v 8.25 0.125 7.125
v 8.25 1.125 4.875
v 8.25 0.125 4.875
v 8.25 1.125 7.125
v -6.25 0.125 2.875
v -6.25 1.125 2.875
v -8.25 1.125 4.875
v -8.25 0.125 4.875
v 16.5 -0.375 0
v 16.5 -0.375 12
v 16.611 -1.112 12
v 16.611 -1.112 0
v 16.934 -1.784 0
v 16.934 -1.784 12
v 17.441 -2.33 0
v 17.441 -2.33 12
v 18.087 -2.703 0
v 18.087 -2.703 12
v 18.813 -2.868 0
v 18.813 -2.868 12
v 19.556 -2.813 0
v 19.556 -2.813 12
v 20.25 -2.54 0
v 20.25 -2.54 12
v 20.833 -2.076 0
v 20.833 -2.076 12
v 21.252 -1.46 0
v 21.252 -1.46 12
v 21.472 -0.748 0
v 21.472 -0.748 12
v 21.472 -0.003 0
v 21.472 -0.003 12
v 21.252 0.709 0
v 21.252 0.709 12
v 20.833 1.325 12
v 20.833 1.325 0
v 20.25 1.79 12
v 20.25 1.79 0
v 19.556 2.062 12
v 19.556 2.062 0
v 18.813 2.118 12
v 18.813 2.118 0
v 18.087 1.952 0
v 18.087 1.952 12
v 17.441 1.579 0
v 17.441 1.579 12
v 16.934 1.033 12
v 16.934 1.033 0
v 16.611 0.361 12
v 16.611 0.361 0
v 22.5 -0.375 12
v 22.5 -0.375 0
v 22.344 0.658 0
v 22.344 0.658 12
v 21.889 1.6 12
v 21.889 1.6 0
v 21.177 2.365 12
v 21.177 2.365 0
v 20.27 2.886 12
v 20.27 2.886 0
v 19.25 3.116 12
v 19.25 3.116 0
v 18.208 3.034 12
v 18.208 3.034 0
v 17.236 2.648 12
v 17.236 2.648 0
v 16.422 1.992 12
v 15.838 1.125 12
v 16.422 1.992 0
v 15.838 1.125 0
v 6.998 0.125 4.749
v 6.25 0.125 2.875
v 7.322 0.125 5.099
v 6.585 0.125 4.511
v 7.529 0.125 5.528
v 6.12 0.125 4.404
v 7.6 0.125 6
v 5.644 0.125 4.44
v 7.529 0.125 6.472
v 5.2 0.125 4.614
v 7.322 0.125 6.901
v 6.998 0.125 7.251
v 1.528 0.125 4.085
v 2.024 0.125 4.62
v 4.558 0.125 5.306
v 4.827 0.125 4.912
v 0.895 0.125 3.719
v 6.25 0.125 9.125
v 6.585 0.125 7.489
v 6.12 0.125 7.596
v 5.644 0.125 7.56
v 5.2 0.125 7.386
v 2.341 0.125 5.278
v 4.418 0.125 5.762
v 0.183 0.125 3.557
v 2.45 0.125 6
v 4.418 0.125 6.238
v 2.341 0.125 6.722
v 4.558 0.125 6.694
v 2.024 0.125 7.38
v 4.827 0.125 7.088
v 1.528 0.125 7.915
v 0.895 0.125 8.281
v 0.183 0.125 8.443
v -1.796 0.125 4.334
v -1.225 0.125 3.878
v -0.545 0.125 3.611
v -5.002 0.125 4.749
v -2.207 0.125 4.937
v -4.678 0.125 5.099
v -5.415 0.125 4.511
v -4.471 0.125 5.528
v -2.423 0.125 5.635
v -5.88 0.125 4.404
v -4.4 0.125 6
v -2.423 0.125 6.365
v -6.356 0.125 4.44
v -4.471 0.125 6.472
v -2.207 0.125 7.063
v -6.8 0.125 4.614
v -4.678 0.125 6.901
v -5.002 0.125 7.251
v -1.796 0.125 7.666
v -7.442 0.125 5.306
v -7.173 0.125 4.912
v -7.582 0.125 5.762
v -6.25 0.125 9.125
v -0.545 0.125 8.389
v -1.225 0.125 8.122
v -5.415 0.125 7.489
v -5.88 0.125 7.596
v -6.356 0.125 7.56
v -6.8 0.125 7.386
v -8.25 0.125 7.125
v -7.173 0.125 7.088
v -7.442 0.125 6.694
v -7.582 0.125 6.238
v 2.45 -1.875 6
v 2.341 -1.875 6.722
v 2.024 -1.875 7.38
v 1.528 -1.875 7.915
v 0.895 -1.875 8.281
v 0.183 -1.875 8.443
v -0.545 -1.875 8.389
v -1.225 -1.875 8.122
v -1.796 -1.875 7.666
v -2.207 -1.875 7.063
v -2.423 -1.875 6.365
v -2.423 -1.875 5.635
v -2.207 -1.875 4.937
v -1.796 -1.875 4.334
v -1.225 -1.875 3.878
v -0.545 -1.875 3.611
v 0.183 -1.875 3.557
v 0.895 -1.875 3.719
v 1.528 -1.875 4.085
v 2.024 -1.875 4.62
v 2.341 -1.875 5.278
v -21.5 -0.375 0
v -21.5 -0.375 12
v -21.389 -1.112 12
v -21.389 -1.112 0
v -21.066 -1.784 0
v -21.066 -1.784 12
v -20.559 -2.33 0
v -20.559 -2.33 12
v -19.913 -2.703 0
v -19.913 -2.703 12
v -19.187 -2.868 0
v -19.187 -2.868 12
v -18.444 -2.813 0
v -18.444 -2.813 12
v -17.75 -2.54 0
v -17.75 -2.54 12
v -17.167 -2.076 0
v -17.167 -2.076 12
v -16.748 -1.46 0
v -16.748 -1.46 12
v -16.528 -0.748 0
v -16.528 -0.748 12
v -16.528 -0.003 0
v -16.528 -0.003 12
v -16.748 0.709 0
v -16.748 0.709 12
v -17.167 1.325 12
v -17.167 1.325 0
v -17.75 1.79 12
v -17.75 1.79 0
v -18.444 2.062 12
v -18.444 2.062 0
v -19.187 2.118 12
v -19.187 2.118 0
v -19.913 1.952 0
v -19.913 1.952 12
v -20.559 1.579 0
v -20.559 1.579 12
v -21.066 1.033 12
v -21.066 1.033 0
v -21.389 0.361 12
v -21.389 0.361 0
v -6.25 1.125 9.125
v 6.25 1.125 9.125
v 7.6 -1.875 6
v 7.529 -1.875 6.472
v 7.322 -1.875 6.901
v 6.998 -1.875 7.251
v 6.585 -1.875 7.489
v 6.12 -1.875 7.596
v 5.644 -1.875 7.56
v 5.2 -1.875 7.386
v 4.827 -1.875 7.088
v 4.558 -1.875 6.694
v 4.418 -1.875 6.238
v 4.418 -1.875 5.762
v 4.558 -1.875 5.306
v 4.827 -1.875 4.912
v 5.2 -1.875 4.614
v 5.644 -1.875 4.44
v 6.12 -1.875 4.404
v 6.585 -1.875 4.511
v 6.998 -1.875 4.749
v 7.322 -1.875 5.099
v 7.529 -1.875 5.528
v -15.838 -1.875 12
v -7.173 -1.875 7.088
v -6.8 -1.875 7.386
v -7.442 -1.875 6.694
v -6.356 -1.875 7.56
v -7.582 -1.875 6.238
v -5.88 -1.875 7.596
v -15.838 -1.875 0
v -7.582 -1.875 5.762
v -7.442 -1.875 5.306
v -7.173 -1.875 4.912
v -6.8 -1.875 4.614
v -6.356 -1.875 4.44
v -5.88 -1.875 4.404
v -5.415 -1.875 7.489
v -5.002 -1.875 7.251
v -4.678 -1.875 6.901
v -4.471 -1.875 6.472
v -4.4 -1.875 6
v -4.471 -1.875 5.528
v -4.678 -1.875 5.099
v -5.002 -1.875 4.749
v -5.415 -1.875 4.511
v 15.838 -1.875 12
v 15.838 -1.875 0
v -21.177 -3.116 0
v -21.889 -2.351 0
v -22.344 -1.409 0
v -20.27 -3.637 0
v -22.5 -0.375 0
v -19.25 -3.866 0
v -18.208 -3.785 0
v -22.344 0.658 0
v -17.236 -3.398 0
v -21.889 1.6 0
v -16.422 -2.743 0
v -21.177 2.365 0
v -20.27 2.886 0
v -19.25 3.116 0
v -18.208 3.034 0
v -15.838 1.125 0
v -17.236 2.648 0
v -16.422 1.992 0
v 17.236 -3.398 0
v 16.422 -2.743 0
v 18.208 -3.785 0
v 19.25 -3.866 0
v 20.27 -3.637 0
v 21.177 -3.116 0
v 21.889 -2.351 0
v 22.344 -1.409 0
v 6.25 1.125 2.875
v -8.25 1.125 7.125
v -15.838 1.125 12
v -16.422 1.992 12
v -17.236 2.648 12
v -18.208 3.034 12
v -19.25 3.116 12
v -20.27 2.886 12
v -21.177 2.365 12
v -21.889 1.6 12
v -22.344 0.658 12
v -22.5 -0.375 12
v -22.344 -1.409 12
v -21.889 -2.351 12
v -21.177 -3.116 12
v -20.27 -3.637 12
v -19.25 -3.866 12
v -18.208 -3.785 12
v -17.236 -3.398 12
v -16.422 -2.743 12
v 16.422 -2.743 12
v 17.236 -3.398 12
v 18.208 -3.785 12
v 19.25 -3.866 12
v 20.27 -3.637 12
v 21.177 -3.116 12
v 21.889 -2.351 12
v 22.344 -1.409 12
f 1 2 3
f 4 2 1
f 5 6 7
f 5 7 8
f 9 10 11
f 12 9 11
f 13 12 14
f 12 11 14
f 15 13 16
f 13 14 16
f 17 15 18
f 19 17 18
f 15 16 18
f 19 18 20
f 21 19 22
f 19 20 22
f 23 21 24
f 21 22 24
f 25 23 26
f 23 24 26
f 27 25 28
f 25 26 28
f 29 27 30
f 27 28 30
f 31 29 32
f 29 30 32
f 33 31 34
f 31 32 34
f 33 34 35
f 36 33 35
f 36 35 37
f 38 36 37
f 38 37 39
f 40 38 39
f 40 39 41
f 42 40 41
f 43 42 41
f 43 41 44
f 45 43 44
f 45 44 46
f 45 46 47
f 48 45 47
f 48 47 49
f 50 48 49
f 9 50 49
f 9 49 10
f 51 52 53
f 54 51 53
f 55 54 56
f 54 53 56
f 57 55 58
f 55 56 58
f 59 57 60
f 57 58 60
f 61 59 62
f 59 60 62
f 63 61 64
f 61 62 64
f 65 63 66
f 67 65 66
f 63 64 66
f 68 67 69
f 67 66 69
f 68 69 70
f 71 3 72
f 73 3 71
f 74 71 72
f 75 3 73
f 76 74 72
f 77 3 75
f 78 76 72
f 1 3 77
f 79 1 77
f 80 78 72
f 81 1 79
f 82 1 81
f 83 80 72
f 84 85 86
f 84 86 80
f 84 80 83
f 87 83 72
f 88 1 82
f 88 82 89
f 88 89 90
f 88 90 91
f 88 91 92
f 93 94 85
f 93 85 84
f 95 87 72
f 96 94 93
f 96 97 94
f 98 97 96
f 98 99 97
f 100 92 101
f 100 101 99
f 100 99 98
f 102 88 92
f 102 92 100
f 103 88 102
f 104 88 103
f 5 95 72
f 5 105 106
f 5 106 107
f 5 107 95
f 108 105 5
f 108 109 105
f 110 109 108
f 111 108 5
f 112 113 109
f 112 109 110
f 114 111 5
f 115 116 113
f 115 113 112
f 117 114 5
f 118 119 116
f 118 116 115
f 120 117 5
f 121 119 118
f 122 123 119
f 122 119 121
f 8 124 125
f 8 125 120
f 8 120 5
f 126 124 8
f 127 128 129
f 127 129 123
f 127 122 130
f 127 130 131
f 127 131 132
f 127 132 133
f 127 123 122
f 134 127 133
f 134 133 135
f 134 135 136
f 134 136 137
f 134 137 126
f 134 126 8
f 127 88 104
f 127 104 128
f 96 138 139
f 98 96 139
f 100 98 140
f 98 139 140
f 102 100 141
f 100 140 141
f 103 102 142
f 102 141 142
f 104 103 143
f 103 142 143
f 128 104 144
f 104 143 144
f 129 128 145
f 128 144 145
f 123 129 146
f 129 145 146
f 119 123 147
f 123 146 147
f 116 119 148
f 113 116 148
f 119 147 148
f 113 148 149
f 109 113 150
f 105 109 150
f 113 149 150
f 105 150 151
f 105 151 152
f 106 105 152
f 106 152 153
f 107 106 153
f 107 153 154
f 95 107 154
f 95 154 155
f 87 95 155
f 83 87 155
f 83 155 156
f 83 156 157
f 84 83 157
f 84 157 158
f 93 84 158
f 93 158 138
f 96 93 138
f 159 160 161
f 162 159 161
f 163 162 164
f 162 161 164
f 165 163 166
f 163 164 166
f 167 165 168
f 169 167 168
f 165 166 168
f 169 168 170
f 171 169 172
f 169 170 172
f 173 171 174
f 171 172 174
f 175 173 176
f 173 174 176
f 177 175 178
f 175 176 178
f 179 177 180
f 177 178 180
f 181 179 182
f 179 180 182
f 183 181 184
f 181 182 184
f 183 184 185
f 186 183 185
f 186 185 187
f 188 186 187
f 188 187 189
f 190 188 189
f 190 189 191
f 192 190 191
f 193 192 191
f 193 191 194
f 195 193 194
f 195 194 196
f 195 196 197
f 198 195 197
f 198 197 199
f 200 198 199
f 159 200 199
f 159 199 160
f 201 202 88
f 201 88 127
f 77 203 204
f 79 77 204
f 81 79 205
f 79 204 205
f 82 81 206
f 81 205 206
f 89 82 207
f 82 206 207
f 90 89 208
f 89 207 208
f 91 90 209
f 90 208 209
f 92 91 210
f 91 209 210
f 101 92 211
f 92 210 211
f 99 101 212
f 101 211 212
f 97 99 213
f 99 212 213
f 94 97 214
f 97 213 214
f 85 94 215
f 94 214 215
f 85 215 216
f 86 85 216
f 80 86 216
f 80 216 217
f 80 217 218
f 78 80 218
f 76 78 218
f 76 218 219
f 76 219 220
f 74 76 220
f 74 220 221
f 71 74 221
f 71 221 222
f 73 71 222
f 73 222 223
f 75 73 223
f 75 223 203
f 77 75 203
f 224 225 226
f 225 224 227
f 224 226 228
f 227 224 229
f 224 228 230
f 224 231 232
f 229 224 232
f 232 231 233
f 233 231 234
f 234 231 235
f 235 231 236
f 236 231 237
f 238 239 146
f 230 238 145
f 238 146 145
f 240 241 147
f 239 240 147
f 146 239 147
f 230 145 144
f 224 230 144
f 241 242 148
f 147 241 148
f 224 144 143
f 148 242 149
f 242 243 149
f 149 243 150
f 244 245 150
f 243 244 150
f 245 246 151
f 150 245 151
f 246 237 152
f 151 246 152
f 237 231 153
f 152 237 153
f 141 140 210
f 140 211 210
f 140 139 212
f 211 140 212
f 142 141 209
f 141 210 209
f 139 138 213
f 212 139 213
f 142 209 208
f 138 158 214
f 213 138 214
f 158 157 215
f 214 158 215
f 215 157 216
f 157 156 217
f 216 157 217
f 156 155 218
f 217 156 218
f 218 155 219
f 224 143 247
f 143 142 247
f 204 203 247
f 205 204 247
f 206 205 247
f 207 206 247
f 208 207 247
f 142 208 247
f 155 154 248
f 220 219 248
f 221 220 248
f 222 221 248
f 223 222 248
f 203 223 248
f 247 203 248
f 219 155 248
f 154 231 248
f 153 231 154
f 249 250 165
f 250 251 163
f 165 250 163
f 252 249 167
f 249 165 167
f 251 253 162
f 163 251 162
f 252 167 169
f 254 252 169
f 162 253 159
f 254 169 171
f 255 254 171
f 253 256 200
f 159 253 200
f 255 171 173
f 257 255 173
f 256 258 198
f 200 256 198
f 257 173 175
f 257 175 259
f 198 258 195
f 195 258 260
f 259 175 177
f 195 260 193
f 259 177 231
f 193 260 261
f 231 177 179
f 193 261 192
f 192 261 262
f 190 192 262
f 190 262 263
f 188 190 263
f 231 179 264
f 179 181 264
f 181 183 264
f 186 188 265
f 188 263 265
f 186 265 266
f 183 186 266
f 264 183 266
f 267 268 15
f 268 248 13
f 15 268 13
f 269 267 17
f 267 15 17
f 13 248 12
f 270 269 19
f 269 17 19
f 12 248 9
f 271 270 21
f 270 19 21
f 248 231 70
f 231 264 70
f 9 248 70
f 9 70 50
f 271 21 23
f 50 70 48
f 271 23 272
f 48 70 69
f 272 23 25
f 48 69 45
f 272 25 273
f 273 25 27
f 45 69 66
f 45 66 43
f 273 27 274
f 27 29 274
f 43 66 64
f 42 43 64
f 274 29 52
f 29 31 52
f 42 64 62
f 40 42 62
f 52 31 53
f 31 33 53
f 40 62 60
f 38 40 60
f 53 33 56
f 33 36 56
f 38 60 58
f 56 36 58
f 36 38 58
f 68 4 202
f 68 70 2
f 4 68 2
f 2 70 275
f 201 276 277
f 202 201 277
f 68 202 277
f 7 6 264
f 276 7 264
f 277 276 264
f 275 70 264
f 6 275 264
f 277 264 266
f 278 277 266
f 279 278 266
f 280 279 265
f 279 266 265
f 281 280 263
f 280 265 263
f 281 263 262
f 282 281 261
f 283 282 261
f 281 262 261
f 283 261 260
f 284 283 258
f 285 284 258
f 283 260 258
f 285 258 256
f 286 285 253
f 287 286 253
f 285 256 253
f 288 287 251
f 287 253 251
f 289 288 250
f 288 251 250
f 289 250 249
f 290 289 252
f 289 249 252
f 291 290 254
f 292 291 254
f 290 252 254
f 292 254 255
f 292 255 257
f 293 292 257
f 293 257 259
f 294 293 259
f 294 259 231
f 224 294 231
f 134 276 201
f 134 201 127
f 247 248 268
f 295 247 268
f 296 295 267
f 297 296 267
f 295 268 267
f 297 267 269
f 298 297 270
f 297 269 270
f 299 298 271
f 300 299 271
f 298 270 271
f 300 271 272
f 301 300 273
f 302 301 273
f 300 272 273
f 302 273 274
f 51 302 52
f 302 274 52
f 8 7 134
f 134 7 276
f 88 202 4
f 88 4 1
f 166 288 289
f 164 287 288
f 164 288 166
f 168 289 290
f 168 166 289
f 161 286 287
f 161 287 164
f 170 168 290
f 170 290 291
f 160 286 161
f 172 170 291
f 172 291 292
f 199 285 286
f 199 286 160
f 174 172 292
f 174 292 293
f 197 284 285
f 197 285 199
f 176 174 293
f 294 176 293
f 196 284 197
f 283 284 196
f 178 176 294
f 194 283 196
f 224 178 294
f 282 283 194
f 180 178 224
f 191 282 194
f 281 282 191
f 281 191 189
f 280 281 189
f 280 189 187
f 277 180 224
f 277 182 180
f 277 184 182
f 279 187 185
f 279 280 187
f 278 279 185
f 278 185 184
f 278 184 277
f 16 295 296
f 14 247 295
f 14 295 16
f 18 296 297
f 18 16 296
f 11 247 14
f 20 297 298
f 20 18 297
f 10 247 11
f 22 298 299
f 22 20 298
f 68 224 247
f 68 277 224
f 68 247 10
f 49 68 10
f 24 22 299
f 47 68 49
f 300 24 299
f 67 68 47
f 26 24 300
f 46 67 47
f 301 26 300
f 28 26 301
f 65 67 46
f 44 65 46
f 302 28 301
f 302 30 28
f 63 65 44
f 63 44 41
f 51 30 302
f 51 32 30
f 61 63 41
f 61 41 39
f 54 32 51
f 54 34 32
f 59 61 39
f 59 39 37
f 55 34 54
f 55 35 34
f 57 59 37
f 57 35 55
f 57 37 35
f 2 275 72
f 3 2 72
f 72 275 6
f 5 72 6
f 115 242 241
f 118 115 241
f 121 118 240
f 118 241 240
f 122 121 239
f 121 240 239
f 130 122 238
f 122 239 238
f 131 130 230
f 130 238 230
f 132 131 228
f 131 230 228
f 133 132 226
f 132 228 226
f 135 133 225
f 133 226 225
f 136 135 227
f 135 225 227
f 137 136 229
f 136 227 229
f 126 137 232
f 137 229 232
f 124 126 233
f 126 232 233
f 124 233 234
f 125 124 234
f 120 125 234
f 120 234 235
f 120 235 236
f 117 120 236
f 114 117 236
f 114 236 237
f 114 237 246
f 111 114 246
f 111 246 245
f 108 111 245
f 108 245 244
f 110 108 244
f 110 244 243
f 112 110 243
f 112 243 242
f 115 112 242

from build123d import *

# Parameters (mm, degrees)
F1_DEPTH = 12
F2_D     = 5
F2_DEPTH = 15
F2_TIP   = 1.5021515476
F3_D     = 5
F3_DEPTH = 15
F3_TIP   = 1.5021515476
F5_D     = 4.9
F5_DEPTH = 10
F5_TIP   = 1.4721085166
F6_D     = 3.2
F6_DEPTH = 15
F6_TIP   = 0.9613769904
F7_D     = 3.2
F7_DEPTH = 15
F7_TIP   = 0.9613769904
F8_W     = 16.5
F8_H     = 6.25
F9_DEPTH = 1
F10_SIZE = 2


# Not quite as in the source:
# - a feature names something its author has since deleted; it is built from what else it names


with BuildPart() as f1:
    # F0 (on Top) → F1 (new body)
    with BuildSketch(Plane.XY):
        with BuildLine():
            Line((-19, -1.8754155822), (-19, 1.1245844178))
            Line((-19, 1.1245844178), (-15.8377223398, 1.1245844178))
            ThreePointArc((-15.8377223398, 1.1245844178), (-22.5, -0.3754155822), (-15.8377223398, -1.8754155822))
            Line((-15.8377223398, -1.8754155822), (-19, -1.8754155822))
        make_face()
        with BuildLine():
            Line((-15.8377223398, 1.1245844178), (-19, 1.1245844178))
            Line((-19, 1.1245844178), (-19, -1.8754155822))
            Line((-19, -1.8754155822), (-15.8377223398, -1.8754155822))
            ThreePointArc((-15.8377223398, -1.8754155822), (-15.5854742781, -1.144189993), (-15.5, -0.3754155822))
            ThreePointArc((-15.5, -0.3754155822), (-15.5854742781, 0.3933588286), (-15.8377223398, 1.1245844178))
        make_face()
        with BuildLine():
            Line((15.8377223398, 1.1245844178), (-15.8377223398, 1.1245844178))
            ThreePointArc((-15.8377223398, 1.1245844178), (-15.5854742781, 0.3933588286), (-15.5, -0.3754155822))
            ThreePointArc((-15.5, -0.3754155822), (-15.5854742781, -1.144189993), (-15.8377223398, -1.8754155822))
            Line((-15.8377223398, -1.8754155822), (15.8377223398, -1.8754155822))
            ThreePointArc((15.8377223398, -1.8754155822), (15.5, -0.3754155822), (15.8377223398, 1.1245844178))
        make_face()
        with BuildLine():
            ThreePointArc((22.5, -0.3754155822), (19.7687744108, 3.0391101397), (15.8377223398, 1.1245844178))
            Line((15.8377223398, 1.1245844178), (19, 1.1245844178))
            Line((19, 1.1245844178), (19, -1.8754155822))
            Line((19, -1.8754155822), (15.8377223398, -1.8754155822))
            ThreePointArc((15.8377223398, -1.8754155822), (19.7687744108, -3.7899413041), (22.5, -0.3754155822))
        make_face()
        with BuildLine():
            Line((19, 1.1245844178), (15.8377223398, 1.1245844178))
            ThreePointArc((15.8377223398, 1.1245844178), (15.5, -0.3754155822), (15.8377223398, -1.8754155822))
            Line((15.8377223398, -1.8754155822), (19, -1.8754155822))
            Line((19, -1.8754155822), (19, 1.1245844178))
        make_face()
    extrude(amount=F1_DEPTH)

    # F2
    with Locations(Plane(origin=(0, 0, 0), x_dir=(1, 0, 0), z_dir=(0, 0, -1))):
        with Locations((19, 0.3754155822)):
            Hole(F2_D / 2, depth=F2_DEPTH)
            with Locations((0, 0, -(F2_DEPTH + F2_TIP / 2))):  # 118° drill point
                Cone(0, F2_D / 2, F2_TIP, mode=Mode.SUBTRACT)

    # F3
    with Locations(Plane(origin=(0, 0, 0), x_dir=(1, 0, 0), z_dir=(0, 0, -1))):
        with Locations((-19, 0.3754155822)):
            Hole(F3_D / 2, depth=F3_DEPTH)
            with Locations((0, 0, -(F3_DEPTH + F3_TIP / 2))):  # 118° drill point
                Cone(0, F3_D / 2, F3_TIP, mode=Mode.SUBTRACT)

    # F5
    with Locations(Plane(origin=(0, 1.1245844178, 0), x_dir=(-1, 0, 0), z_dir=(0, 1, 0))):
        with Locations((0, 6)):
            Hole(F5_D / 2, depth=F5_DEPTH)
            with Locations((0, 0, -(F5_DEPTH + F5_TIP / 2))):  # 118° drill point
                Cone(0, F5_D / 2, F5_TIP, mode=Mode.SUBTRACT)

    # F6
    with Locations(Plane(origin=(0, 1.1245844178, 0), x_dir=(-1, 0, 0), z_dir=(0, 1, 0))):
        with Locations((-6, 6)):
            Hole(F6_D / 2, depth=F6_DEPTH)
            with Locations((0, 0, -(F6_DEPTH + F6_TIP / 2))):  # 118° drill point
                Cone(0, F6_D / 2, F6_TIP, mode=Mode.SUBTRACT)

    # F7
    with Locations(Plane(origin=(0, 1.1245844178, 0), x_dir=(-1, 0, 0), z_dir=(0, 1, 0))):
        with Locations((6, 6)):
            Hole(F7_D / 2, depth=F7_DEPTH)
            with Locations((0, 0, -(F7_DEPTH + F7_TIP / 2))):  # 118° drill point
                Cone(0, F7_D / 2, F7_TIP, mode=Mode.SUBTRACT)

    # F8 (on face) → F9 (cut)
    with BuildSketch(Plane(origin=(0, 1.1245844178, 0), x_dir=(-1, 0, 0), z_dir=(0, 1, 0))):
        with Locations((0, 6)):
            Rectangle(F8_W, F8_H)
    extrude(amount=-F9_DEPTH, mode=Mode.SUBTRACT)

    # F10
    f10_edges = [f1.edges().sort_by_distance(p)[0] for p in [
        (8.25, 0.624584, 9.125),
        (8.25, 0.624584, 2.875),
        (-8.25, 0.624584, 9.125),
        (-8.25, 0.624584, 2.875),
    ]]
    chamfer(f10_edges, length=F10_SIZE)


solid = f1.part
